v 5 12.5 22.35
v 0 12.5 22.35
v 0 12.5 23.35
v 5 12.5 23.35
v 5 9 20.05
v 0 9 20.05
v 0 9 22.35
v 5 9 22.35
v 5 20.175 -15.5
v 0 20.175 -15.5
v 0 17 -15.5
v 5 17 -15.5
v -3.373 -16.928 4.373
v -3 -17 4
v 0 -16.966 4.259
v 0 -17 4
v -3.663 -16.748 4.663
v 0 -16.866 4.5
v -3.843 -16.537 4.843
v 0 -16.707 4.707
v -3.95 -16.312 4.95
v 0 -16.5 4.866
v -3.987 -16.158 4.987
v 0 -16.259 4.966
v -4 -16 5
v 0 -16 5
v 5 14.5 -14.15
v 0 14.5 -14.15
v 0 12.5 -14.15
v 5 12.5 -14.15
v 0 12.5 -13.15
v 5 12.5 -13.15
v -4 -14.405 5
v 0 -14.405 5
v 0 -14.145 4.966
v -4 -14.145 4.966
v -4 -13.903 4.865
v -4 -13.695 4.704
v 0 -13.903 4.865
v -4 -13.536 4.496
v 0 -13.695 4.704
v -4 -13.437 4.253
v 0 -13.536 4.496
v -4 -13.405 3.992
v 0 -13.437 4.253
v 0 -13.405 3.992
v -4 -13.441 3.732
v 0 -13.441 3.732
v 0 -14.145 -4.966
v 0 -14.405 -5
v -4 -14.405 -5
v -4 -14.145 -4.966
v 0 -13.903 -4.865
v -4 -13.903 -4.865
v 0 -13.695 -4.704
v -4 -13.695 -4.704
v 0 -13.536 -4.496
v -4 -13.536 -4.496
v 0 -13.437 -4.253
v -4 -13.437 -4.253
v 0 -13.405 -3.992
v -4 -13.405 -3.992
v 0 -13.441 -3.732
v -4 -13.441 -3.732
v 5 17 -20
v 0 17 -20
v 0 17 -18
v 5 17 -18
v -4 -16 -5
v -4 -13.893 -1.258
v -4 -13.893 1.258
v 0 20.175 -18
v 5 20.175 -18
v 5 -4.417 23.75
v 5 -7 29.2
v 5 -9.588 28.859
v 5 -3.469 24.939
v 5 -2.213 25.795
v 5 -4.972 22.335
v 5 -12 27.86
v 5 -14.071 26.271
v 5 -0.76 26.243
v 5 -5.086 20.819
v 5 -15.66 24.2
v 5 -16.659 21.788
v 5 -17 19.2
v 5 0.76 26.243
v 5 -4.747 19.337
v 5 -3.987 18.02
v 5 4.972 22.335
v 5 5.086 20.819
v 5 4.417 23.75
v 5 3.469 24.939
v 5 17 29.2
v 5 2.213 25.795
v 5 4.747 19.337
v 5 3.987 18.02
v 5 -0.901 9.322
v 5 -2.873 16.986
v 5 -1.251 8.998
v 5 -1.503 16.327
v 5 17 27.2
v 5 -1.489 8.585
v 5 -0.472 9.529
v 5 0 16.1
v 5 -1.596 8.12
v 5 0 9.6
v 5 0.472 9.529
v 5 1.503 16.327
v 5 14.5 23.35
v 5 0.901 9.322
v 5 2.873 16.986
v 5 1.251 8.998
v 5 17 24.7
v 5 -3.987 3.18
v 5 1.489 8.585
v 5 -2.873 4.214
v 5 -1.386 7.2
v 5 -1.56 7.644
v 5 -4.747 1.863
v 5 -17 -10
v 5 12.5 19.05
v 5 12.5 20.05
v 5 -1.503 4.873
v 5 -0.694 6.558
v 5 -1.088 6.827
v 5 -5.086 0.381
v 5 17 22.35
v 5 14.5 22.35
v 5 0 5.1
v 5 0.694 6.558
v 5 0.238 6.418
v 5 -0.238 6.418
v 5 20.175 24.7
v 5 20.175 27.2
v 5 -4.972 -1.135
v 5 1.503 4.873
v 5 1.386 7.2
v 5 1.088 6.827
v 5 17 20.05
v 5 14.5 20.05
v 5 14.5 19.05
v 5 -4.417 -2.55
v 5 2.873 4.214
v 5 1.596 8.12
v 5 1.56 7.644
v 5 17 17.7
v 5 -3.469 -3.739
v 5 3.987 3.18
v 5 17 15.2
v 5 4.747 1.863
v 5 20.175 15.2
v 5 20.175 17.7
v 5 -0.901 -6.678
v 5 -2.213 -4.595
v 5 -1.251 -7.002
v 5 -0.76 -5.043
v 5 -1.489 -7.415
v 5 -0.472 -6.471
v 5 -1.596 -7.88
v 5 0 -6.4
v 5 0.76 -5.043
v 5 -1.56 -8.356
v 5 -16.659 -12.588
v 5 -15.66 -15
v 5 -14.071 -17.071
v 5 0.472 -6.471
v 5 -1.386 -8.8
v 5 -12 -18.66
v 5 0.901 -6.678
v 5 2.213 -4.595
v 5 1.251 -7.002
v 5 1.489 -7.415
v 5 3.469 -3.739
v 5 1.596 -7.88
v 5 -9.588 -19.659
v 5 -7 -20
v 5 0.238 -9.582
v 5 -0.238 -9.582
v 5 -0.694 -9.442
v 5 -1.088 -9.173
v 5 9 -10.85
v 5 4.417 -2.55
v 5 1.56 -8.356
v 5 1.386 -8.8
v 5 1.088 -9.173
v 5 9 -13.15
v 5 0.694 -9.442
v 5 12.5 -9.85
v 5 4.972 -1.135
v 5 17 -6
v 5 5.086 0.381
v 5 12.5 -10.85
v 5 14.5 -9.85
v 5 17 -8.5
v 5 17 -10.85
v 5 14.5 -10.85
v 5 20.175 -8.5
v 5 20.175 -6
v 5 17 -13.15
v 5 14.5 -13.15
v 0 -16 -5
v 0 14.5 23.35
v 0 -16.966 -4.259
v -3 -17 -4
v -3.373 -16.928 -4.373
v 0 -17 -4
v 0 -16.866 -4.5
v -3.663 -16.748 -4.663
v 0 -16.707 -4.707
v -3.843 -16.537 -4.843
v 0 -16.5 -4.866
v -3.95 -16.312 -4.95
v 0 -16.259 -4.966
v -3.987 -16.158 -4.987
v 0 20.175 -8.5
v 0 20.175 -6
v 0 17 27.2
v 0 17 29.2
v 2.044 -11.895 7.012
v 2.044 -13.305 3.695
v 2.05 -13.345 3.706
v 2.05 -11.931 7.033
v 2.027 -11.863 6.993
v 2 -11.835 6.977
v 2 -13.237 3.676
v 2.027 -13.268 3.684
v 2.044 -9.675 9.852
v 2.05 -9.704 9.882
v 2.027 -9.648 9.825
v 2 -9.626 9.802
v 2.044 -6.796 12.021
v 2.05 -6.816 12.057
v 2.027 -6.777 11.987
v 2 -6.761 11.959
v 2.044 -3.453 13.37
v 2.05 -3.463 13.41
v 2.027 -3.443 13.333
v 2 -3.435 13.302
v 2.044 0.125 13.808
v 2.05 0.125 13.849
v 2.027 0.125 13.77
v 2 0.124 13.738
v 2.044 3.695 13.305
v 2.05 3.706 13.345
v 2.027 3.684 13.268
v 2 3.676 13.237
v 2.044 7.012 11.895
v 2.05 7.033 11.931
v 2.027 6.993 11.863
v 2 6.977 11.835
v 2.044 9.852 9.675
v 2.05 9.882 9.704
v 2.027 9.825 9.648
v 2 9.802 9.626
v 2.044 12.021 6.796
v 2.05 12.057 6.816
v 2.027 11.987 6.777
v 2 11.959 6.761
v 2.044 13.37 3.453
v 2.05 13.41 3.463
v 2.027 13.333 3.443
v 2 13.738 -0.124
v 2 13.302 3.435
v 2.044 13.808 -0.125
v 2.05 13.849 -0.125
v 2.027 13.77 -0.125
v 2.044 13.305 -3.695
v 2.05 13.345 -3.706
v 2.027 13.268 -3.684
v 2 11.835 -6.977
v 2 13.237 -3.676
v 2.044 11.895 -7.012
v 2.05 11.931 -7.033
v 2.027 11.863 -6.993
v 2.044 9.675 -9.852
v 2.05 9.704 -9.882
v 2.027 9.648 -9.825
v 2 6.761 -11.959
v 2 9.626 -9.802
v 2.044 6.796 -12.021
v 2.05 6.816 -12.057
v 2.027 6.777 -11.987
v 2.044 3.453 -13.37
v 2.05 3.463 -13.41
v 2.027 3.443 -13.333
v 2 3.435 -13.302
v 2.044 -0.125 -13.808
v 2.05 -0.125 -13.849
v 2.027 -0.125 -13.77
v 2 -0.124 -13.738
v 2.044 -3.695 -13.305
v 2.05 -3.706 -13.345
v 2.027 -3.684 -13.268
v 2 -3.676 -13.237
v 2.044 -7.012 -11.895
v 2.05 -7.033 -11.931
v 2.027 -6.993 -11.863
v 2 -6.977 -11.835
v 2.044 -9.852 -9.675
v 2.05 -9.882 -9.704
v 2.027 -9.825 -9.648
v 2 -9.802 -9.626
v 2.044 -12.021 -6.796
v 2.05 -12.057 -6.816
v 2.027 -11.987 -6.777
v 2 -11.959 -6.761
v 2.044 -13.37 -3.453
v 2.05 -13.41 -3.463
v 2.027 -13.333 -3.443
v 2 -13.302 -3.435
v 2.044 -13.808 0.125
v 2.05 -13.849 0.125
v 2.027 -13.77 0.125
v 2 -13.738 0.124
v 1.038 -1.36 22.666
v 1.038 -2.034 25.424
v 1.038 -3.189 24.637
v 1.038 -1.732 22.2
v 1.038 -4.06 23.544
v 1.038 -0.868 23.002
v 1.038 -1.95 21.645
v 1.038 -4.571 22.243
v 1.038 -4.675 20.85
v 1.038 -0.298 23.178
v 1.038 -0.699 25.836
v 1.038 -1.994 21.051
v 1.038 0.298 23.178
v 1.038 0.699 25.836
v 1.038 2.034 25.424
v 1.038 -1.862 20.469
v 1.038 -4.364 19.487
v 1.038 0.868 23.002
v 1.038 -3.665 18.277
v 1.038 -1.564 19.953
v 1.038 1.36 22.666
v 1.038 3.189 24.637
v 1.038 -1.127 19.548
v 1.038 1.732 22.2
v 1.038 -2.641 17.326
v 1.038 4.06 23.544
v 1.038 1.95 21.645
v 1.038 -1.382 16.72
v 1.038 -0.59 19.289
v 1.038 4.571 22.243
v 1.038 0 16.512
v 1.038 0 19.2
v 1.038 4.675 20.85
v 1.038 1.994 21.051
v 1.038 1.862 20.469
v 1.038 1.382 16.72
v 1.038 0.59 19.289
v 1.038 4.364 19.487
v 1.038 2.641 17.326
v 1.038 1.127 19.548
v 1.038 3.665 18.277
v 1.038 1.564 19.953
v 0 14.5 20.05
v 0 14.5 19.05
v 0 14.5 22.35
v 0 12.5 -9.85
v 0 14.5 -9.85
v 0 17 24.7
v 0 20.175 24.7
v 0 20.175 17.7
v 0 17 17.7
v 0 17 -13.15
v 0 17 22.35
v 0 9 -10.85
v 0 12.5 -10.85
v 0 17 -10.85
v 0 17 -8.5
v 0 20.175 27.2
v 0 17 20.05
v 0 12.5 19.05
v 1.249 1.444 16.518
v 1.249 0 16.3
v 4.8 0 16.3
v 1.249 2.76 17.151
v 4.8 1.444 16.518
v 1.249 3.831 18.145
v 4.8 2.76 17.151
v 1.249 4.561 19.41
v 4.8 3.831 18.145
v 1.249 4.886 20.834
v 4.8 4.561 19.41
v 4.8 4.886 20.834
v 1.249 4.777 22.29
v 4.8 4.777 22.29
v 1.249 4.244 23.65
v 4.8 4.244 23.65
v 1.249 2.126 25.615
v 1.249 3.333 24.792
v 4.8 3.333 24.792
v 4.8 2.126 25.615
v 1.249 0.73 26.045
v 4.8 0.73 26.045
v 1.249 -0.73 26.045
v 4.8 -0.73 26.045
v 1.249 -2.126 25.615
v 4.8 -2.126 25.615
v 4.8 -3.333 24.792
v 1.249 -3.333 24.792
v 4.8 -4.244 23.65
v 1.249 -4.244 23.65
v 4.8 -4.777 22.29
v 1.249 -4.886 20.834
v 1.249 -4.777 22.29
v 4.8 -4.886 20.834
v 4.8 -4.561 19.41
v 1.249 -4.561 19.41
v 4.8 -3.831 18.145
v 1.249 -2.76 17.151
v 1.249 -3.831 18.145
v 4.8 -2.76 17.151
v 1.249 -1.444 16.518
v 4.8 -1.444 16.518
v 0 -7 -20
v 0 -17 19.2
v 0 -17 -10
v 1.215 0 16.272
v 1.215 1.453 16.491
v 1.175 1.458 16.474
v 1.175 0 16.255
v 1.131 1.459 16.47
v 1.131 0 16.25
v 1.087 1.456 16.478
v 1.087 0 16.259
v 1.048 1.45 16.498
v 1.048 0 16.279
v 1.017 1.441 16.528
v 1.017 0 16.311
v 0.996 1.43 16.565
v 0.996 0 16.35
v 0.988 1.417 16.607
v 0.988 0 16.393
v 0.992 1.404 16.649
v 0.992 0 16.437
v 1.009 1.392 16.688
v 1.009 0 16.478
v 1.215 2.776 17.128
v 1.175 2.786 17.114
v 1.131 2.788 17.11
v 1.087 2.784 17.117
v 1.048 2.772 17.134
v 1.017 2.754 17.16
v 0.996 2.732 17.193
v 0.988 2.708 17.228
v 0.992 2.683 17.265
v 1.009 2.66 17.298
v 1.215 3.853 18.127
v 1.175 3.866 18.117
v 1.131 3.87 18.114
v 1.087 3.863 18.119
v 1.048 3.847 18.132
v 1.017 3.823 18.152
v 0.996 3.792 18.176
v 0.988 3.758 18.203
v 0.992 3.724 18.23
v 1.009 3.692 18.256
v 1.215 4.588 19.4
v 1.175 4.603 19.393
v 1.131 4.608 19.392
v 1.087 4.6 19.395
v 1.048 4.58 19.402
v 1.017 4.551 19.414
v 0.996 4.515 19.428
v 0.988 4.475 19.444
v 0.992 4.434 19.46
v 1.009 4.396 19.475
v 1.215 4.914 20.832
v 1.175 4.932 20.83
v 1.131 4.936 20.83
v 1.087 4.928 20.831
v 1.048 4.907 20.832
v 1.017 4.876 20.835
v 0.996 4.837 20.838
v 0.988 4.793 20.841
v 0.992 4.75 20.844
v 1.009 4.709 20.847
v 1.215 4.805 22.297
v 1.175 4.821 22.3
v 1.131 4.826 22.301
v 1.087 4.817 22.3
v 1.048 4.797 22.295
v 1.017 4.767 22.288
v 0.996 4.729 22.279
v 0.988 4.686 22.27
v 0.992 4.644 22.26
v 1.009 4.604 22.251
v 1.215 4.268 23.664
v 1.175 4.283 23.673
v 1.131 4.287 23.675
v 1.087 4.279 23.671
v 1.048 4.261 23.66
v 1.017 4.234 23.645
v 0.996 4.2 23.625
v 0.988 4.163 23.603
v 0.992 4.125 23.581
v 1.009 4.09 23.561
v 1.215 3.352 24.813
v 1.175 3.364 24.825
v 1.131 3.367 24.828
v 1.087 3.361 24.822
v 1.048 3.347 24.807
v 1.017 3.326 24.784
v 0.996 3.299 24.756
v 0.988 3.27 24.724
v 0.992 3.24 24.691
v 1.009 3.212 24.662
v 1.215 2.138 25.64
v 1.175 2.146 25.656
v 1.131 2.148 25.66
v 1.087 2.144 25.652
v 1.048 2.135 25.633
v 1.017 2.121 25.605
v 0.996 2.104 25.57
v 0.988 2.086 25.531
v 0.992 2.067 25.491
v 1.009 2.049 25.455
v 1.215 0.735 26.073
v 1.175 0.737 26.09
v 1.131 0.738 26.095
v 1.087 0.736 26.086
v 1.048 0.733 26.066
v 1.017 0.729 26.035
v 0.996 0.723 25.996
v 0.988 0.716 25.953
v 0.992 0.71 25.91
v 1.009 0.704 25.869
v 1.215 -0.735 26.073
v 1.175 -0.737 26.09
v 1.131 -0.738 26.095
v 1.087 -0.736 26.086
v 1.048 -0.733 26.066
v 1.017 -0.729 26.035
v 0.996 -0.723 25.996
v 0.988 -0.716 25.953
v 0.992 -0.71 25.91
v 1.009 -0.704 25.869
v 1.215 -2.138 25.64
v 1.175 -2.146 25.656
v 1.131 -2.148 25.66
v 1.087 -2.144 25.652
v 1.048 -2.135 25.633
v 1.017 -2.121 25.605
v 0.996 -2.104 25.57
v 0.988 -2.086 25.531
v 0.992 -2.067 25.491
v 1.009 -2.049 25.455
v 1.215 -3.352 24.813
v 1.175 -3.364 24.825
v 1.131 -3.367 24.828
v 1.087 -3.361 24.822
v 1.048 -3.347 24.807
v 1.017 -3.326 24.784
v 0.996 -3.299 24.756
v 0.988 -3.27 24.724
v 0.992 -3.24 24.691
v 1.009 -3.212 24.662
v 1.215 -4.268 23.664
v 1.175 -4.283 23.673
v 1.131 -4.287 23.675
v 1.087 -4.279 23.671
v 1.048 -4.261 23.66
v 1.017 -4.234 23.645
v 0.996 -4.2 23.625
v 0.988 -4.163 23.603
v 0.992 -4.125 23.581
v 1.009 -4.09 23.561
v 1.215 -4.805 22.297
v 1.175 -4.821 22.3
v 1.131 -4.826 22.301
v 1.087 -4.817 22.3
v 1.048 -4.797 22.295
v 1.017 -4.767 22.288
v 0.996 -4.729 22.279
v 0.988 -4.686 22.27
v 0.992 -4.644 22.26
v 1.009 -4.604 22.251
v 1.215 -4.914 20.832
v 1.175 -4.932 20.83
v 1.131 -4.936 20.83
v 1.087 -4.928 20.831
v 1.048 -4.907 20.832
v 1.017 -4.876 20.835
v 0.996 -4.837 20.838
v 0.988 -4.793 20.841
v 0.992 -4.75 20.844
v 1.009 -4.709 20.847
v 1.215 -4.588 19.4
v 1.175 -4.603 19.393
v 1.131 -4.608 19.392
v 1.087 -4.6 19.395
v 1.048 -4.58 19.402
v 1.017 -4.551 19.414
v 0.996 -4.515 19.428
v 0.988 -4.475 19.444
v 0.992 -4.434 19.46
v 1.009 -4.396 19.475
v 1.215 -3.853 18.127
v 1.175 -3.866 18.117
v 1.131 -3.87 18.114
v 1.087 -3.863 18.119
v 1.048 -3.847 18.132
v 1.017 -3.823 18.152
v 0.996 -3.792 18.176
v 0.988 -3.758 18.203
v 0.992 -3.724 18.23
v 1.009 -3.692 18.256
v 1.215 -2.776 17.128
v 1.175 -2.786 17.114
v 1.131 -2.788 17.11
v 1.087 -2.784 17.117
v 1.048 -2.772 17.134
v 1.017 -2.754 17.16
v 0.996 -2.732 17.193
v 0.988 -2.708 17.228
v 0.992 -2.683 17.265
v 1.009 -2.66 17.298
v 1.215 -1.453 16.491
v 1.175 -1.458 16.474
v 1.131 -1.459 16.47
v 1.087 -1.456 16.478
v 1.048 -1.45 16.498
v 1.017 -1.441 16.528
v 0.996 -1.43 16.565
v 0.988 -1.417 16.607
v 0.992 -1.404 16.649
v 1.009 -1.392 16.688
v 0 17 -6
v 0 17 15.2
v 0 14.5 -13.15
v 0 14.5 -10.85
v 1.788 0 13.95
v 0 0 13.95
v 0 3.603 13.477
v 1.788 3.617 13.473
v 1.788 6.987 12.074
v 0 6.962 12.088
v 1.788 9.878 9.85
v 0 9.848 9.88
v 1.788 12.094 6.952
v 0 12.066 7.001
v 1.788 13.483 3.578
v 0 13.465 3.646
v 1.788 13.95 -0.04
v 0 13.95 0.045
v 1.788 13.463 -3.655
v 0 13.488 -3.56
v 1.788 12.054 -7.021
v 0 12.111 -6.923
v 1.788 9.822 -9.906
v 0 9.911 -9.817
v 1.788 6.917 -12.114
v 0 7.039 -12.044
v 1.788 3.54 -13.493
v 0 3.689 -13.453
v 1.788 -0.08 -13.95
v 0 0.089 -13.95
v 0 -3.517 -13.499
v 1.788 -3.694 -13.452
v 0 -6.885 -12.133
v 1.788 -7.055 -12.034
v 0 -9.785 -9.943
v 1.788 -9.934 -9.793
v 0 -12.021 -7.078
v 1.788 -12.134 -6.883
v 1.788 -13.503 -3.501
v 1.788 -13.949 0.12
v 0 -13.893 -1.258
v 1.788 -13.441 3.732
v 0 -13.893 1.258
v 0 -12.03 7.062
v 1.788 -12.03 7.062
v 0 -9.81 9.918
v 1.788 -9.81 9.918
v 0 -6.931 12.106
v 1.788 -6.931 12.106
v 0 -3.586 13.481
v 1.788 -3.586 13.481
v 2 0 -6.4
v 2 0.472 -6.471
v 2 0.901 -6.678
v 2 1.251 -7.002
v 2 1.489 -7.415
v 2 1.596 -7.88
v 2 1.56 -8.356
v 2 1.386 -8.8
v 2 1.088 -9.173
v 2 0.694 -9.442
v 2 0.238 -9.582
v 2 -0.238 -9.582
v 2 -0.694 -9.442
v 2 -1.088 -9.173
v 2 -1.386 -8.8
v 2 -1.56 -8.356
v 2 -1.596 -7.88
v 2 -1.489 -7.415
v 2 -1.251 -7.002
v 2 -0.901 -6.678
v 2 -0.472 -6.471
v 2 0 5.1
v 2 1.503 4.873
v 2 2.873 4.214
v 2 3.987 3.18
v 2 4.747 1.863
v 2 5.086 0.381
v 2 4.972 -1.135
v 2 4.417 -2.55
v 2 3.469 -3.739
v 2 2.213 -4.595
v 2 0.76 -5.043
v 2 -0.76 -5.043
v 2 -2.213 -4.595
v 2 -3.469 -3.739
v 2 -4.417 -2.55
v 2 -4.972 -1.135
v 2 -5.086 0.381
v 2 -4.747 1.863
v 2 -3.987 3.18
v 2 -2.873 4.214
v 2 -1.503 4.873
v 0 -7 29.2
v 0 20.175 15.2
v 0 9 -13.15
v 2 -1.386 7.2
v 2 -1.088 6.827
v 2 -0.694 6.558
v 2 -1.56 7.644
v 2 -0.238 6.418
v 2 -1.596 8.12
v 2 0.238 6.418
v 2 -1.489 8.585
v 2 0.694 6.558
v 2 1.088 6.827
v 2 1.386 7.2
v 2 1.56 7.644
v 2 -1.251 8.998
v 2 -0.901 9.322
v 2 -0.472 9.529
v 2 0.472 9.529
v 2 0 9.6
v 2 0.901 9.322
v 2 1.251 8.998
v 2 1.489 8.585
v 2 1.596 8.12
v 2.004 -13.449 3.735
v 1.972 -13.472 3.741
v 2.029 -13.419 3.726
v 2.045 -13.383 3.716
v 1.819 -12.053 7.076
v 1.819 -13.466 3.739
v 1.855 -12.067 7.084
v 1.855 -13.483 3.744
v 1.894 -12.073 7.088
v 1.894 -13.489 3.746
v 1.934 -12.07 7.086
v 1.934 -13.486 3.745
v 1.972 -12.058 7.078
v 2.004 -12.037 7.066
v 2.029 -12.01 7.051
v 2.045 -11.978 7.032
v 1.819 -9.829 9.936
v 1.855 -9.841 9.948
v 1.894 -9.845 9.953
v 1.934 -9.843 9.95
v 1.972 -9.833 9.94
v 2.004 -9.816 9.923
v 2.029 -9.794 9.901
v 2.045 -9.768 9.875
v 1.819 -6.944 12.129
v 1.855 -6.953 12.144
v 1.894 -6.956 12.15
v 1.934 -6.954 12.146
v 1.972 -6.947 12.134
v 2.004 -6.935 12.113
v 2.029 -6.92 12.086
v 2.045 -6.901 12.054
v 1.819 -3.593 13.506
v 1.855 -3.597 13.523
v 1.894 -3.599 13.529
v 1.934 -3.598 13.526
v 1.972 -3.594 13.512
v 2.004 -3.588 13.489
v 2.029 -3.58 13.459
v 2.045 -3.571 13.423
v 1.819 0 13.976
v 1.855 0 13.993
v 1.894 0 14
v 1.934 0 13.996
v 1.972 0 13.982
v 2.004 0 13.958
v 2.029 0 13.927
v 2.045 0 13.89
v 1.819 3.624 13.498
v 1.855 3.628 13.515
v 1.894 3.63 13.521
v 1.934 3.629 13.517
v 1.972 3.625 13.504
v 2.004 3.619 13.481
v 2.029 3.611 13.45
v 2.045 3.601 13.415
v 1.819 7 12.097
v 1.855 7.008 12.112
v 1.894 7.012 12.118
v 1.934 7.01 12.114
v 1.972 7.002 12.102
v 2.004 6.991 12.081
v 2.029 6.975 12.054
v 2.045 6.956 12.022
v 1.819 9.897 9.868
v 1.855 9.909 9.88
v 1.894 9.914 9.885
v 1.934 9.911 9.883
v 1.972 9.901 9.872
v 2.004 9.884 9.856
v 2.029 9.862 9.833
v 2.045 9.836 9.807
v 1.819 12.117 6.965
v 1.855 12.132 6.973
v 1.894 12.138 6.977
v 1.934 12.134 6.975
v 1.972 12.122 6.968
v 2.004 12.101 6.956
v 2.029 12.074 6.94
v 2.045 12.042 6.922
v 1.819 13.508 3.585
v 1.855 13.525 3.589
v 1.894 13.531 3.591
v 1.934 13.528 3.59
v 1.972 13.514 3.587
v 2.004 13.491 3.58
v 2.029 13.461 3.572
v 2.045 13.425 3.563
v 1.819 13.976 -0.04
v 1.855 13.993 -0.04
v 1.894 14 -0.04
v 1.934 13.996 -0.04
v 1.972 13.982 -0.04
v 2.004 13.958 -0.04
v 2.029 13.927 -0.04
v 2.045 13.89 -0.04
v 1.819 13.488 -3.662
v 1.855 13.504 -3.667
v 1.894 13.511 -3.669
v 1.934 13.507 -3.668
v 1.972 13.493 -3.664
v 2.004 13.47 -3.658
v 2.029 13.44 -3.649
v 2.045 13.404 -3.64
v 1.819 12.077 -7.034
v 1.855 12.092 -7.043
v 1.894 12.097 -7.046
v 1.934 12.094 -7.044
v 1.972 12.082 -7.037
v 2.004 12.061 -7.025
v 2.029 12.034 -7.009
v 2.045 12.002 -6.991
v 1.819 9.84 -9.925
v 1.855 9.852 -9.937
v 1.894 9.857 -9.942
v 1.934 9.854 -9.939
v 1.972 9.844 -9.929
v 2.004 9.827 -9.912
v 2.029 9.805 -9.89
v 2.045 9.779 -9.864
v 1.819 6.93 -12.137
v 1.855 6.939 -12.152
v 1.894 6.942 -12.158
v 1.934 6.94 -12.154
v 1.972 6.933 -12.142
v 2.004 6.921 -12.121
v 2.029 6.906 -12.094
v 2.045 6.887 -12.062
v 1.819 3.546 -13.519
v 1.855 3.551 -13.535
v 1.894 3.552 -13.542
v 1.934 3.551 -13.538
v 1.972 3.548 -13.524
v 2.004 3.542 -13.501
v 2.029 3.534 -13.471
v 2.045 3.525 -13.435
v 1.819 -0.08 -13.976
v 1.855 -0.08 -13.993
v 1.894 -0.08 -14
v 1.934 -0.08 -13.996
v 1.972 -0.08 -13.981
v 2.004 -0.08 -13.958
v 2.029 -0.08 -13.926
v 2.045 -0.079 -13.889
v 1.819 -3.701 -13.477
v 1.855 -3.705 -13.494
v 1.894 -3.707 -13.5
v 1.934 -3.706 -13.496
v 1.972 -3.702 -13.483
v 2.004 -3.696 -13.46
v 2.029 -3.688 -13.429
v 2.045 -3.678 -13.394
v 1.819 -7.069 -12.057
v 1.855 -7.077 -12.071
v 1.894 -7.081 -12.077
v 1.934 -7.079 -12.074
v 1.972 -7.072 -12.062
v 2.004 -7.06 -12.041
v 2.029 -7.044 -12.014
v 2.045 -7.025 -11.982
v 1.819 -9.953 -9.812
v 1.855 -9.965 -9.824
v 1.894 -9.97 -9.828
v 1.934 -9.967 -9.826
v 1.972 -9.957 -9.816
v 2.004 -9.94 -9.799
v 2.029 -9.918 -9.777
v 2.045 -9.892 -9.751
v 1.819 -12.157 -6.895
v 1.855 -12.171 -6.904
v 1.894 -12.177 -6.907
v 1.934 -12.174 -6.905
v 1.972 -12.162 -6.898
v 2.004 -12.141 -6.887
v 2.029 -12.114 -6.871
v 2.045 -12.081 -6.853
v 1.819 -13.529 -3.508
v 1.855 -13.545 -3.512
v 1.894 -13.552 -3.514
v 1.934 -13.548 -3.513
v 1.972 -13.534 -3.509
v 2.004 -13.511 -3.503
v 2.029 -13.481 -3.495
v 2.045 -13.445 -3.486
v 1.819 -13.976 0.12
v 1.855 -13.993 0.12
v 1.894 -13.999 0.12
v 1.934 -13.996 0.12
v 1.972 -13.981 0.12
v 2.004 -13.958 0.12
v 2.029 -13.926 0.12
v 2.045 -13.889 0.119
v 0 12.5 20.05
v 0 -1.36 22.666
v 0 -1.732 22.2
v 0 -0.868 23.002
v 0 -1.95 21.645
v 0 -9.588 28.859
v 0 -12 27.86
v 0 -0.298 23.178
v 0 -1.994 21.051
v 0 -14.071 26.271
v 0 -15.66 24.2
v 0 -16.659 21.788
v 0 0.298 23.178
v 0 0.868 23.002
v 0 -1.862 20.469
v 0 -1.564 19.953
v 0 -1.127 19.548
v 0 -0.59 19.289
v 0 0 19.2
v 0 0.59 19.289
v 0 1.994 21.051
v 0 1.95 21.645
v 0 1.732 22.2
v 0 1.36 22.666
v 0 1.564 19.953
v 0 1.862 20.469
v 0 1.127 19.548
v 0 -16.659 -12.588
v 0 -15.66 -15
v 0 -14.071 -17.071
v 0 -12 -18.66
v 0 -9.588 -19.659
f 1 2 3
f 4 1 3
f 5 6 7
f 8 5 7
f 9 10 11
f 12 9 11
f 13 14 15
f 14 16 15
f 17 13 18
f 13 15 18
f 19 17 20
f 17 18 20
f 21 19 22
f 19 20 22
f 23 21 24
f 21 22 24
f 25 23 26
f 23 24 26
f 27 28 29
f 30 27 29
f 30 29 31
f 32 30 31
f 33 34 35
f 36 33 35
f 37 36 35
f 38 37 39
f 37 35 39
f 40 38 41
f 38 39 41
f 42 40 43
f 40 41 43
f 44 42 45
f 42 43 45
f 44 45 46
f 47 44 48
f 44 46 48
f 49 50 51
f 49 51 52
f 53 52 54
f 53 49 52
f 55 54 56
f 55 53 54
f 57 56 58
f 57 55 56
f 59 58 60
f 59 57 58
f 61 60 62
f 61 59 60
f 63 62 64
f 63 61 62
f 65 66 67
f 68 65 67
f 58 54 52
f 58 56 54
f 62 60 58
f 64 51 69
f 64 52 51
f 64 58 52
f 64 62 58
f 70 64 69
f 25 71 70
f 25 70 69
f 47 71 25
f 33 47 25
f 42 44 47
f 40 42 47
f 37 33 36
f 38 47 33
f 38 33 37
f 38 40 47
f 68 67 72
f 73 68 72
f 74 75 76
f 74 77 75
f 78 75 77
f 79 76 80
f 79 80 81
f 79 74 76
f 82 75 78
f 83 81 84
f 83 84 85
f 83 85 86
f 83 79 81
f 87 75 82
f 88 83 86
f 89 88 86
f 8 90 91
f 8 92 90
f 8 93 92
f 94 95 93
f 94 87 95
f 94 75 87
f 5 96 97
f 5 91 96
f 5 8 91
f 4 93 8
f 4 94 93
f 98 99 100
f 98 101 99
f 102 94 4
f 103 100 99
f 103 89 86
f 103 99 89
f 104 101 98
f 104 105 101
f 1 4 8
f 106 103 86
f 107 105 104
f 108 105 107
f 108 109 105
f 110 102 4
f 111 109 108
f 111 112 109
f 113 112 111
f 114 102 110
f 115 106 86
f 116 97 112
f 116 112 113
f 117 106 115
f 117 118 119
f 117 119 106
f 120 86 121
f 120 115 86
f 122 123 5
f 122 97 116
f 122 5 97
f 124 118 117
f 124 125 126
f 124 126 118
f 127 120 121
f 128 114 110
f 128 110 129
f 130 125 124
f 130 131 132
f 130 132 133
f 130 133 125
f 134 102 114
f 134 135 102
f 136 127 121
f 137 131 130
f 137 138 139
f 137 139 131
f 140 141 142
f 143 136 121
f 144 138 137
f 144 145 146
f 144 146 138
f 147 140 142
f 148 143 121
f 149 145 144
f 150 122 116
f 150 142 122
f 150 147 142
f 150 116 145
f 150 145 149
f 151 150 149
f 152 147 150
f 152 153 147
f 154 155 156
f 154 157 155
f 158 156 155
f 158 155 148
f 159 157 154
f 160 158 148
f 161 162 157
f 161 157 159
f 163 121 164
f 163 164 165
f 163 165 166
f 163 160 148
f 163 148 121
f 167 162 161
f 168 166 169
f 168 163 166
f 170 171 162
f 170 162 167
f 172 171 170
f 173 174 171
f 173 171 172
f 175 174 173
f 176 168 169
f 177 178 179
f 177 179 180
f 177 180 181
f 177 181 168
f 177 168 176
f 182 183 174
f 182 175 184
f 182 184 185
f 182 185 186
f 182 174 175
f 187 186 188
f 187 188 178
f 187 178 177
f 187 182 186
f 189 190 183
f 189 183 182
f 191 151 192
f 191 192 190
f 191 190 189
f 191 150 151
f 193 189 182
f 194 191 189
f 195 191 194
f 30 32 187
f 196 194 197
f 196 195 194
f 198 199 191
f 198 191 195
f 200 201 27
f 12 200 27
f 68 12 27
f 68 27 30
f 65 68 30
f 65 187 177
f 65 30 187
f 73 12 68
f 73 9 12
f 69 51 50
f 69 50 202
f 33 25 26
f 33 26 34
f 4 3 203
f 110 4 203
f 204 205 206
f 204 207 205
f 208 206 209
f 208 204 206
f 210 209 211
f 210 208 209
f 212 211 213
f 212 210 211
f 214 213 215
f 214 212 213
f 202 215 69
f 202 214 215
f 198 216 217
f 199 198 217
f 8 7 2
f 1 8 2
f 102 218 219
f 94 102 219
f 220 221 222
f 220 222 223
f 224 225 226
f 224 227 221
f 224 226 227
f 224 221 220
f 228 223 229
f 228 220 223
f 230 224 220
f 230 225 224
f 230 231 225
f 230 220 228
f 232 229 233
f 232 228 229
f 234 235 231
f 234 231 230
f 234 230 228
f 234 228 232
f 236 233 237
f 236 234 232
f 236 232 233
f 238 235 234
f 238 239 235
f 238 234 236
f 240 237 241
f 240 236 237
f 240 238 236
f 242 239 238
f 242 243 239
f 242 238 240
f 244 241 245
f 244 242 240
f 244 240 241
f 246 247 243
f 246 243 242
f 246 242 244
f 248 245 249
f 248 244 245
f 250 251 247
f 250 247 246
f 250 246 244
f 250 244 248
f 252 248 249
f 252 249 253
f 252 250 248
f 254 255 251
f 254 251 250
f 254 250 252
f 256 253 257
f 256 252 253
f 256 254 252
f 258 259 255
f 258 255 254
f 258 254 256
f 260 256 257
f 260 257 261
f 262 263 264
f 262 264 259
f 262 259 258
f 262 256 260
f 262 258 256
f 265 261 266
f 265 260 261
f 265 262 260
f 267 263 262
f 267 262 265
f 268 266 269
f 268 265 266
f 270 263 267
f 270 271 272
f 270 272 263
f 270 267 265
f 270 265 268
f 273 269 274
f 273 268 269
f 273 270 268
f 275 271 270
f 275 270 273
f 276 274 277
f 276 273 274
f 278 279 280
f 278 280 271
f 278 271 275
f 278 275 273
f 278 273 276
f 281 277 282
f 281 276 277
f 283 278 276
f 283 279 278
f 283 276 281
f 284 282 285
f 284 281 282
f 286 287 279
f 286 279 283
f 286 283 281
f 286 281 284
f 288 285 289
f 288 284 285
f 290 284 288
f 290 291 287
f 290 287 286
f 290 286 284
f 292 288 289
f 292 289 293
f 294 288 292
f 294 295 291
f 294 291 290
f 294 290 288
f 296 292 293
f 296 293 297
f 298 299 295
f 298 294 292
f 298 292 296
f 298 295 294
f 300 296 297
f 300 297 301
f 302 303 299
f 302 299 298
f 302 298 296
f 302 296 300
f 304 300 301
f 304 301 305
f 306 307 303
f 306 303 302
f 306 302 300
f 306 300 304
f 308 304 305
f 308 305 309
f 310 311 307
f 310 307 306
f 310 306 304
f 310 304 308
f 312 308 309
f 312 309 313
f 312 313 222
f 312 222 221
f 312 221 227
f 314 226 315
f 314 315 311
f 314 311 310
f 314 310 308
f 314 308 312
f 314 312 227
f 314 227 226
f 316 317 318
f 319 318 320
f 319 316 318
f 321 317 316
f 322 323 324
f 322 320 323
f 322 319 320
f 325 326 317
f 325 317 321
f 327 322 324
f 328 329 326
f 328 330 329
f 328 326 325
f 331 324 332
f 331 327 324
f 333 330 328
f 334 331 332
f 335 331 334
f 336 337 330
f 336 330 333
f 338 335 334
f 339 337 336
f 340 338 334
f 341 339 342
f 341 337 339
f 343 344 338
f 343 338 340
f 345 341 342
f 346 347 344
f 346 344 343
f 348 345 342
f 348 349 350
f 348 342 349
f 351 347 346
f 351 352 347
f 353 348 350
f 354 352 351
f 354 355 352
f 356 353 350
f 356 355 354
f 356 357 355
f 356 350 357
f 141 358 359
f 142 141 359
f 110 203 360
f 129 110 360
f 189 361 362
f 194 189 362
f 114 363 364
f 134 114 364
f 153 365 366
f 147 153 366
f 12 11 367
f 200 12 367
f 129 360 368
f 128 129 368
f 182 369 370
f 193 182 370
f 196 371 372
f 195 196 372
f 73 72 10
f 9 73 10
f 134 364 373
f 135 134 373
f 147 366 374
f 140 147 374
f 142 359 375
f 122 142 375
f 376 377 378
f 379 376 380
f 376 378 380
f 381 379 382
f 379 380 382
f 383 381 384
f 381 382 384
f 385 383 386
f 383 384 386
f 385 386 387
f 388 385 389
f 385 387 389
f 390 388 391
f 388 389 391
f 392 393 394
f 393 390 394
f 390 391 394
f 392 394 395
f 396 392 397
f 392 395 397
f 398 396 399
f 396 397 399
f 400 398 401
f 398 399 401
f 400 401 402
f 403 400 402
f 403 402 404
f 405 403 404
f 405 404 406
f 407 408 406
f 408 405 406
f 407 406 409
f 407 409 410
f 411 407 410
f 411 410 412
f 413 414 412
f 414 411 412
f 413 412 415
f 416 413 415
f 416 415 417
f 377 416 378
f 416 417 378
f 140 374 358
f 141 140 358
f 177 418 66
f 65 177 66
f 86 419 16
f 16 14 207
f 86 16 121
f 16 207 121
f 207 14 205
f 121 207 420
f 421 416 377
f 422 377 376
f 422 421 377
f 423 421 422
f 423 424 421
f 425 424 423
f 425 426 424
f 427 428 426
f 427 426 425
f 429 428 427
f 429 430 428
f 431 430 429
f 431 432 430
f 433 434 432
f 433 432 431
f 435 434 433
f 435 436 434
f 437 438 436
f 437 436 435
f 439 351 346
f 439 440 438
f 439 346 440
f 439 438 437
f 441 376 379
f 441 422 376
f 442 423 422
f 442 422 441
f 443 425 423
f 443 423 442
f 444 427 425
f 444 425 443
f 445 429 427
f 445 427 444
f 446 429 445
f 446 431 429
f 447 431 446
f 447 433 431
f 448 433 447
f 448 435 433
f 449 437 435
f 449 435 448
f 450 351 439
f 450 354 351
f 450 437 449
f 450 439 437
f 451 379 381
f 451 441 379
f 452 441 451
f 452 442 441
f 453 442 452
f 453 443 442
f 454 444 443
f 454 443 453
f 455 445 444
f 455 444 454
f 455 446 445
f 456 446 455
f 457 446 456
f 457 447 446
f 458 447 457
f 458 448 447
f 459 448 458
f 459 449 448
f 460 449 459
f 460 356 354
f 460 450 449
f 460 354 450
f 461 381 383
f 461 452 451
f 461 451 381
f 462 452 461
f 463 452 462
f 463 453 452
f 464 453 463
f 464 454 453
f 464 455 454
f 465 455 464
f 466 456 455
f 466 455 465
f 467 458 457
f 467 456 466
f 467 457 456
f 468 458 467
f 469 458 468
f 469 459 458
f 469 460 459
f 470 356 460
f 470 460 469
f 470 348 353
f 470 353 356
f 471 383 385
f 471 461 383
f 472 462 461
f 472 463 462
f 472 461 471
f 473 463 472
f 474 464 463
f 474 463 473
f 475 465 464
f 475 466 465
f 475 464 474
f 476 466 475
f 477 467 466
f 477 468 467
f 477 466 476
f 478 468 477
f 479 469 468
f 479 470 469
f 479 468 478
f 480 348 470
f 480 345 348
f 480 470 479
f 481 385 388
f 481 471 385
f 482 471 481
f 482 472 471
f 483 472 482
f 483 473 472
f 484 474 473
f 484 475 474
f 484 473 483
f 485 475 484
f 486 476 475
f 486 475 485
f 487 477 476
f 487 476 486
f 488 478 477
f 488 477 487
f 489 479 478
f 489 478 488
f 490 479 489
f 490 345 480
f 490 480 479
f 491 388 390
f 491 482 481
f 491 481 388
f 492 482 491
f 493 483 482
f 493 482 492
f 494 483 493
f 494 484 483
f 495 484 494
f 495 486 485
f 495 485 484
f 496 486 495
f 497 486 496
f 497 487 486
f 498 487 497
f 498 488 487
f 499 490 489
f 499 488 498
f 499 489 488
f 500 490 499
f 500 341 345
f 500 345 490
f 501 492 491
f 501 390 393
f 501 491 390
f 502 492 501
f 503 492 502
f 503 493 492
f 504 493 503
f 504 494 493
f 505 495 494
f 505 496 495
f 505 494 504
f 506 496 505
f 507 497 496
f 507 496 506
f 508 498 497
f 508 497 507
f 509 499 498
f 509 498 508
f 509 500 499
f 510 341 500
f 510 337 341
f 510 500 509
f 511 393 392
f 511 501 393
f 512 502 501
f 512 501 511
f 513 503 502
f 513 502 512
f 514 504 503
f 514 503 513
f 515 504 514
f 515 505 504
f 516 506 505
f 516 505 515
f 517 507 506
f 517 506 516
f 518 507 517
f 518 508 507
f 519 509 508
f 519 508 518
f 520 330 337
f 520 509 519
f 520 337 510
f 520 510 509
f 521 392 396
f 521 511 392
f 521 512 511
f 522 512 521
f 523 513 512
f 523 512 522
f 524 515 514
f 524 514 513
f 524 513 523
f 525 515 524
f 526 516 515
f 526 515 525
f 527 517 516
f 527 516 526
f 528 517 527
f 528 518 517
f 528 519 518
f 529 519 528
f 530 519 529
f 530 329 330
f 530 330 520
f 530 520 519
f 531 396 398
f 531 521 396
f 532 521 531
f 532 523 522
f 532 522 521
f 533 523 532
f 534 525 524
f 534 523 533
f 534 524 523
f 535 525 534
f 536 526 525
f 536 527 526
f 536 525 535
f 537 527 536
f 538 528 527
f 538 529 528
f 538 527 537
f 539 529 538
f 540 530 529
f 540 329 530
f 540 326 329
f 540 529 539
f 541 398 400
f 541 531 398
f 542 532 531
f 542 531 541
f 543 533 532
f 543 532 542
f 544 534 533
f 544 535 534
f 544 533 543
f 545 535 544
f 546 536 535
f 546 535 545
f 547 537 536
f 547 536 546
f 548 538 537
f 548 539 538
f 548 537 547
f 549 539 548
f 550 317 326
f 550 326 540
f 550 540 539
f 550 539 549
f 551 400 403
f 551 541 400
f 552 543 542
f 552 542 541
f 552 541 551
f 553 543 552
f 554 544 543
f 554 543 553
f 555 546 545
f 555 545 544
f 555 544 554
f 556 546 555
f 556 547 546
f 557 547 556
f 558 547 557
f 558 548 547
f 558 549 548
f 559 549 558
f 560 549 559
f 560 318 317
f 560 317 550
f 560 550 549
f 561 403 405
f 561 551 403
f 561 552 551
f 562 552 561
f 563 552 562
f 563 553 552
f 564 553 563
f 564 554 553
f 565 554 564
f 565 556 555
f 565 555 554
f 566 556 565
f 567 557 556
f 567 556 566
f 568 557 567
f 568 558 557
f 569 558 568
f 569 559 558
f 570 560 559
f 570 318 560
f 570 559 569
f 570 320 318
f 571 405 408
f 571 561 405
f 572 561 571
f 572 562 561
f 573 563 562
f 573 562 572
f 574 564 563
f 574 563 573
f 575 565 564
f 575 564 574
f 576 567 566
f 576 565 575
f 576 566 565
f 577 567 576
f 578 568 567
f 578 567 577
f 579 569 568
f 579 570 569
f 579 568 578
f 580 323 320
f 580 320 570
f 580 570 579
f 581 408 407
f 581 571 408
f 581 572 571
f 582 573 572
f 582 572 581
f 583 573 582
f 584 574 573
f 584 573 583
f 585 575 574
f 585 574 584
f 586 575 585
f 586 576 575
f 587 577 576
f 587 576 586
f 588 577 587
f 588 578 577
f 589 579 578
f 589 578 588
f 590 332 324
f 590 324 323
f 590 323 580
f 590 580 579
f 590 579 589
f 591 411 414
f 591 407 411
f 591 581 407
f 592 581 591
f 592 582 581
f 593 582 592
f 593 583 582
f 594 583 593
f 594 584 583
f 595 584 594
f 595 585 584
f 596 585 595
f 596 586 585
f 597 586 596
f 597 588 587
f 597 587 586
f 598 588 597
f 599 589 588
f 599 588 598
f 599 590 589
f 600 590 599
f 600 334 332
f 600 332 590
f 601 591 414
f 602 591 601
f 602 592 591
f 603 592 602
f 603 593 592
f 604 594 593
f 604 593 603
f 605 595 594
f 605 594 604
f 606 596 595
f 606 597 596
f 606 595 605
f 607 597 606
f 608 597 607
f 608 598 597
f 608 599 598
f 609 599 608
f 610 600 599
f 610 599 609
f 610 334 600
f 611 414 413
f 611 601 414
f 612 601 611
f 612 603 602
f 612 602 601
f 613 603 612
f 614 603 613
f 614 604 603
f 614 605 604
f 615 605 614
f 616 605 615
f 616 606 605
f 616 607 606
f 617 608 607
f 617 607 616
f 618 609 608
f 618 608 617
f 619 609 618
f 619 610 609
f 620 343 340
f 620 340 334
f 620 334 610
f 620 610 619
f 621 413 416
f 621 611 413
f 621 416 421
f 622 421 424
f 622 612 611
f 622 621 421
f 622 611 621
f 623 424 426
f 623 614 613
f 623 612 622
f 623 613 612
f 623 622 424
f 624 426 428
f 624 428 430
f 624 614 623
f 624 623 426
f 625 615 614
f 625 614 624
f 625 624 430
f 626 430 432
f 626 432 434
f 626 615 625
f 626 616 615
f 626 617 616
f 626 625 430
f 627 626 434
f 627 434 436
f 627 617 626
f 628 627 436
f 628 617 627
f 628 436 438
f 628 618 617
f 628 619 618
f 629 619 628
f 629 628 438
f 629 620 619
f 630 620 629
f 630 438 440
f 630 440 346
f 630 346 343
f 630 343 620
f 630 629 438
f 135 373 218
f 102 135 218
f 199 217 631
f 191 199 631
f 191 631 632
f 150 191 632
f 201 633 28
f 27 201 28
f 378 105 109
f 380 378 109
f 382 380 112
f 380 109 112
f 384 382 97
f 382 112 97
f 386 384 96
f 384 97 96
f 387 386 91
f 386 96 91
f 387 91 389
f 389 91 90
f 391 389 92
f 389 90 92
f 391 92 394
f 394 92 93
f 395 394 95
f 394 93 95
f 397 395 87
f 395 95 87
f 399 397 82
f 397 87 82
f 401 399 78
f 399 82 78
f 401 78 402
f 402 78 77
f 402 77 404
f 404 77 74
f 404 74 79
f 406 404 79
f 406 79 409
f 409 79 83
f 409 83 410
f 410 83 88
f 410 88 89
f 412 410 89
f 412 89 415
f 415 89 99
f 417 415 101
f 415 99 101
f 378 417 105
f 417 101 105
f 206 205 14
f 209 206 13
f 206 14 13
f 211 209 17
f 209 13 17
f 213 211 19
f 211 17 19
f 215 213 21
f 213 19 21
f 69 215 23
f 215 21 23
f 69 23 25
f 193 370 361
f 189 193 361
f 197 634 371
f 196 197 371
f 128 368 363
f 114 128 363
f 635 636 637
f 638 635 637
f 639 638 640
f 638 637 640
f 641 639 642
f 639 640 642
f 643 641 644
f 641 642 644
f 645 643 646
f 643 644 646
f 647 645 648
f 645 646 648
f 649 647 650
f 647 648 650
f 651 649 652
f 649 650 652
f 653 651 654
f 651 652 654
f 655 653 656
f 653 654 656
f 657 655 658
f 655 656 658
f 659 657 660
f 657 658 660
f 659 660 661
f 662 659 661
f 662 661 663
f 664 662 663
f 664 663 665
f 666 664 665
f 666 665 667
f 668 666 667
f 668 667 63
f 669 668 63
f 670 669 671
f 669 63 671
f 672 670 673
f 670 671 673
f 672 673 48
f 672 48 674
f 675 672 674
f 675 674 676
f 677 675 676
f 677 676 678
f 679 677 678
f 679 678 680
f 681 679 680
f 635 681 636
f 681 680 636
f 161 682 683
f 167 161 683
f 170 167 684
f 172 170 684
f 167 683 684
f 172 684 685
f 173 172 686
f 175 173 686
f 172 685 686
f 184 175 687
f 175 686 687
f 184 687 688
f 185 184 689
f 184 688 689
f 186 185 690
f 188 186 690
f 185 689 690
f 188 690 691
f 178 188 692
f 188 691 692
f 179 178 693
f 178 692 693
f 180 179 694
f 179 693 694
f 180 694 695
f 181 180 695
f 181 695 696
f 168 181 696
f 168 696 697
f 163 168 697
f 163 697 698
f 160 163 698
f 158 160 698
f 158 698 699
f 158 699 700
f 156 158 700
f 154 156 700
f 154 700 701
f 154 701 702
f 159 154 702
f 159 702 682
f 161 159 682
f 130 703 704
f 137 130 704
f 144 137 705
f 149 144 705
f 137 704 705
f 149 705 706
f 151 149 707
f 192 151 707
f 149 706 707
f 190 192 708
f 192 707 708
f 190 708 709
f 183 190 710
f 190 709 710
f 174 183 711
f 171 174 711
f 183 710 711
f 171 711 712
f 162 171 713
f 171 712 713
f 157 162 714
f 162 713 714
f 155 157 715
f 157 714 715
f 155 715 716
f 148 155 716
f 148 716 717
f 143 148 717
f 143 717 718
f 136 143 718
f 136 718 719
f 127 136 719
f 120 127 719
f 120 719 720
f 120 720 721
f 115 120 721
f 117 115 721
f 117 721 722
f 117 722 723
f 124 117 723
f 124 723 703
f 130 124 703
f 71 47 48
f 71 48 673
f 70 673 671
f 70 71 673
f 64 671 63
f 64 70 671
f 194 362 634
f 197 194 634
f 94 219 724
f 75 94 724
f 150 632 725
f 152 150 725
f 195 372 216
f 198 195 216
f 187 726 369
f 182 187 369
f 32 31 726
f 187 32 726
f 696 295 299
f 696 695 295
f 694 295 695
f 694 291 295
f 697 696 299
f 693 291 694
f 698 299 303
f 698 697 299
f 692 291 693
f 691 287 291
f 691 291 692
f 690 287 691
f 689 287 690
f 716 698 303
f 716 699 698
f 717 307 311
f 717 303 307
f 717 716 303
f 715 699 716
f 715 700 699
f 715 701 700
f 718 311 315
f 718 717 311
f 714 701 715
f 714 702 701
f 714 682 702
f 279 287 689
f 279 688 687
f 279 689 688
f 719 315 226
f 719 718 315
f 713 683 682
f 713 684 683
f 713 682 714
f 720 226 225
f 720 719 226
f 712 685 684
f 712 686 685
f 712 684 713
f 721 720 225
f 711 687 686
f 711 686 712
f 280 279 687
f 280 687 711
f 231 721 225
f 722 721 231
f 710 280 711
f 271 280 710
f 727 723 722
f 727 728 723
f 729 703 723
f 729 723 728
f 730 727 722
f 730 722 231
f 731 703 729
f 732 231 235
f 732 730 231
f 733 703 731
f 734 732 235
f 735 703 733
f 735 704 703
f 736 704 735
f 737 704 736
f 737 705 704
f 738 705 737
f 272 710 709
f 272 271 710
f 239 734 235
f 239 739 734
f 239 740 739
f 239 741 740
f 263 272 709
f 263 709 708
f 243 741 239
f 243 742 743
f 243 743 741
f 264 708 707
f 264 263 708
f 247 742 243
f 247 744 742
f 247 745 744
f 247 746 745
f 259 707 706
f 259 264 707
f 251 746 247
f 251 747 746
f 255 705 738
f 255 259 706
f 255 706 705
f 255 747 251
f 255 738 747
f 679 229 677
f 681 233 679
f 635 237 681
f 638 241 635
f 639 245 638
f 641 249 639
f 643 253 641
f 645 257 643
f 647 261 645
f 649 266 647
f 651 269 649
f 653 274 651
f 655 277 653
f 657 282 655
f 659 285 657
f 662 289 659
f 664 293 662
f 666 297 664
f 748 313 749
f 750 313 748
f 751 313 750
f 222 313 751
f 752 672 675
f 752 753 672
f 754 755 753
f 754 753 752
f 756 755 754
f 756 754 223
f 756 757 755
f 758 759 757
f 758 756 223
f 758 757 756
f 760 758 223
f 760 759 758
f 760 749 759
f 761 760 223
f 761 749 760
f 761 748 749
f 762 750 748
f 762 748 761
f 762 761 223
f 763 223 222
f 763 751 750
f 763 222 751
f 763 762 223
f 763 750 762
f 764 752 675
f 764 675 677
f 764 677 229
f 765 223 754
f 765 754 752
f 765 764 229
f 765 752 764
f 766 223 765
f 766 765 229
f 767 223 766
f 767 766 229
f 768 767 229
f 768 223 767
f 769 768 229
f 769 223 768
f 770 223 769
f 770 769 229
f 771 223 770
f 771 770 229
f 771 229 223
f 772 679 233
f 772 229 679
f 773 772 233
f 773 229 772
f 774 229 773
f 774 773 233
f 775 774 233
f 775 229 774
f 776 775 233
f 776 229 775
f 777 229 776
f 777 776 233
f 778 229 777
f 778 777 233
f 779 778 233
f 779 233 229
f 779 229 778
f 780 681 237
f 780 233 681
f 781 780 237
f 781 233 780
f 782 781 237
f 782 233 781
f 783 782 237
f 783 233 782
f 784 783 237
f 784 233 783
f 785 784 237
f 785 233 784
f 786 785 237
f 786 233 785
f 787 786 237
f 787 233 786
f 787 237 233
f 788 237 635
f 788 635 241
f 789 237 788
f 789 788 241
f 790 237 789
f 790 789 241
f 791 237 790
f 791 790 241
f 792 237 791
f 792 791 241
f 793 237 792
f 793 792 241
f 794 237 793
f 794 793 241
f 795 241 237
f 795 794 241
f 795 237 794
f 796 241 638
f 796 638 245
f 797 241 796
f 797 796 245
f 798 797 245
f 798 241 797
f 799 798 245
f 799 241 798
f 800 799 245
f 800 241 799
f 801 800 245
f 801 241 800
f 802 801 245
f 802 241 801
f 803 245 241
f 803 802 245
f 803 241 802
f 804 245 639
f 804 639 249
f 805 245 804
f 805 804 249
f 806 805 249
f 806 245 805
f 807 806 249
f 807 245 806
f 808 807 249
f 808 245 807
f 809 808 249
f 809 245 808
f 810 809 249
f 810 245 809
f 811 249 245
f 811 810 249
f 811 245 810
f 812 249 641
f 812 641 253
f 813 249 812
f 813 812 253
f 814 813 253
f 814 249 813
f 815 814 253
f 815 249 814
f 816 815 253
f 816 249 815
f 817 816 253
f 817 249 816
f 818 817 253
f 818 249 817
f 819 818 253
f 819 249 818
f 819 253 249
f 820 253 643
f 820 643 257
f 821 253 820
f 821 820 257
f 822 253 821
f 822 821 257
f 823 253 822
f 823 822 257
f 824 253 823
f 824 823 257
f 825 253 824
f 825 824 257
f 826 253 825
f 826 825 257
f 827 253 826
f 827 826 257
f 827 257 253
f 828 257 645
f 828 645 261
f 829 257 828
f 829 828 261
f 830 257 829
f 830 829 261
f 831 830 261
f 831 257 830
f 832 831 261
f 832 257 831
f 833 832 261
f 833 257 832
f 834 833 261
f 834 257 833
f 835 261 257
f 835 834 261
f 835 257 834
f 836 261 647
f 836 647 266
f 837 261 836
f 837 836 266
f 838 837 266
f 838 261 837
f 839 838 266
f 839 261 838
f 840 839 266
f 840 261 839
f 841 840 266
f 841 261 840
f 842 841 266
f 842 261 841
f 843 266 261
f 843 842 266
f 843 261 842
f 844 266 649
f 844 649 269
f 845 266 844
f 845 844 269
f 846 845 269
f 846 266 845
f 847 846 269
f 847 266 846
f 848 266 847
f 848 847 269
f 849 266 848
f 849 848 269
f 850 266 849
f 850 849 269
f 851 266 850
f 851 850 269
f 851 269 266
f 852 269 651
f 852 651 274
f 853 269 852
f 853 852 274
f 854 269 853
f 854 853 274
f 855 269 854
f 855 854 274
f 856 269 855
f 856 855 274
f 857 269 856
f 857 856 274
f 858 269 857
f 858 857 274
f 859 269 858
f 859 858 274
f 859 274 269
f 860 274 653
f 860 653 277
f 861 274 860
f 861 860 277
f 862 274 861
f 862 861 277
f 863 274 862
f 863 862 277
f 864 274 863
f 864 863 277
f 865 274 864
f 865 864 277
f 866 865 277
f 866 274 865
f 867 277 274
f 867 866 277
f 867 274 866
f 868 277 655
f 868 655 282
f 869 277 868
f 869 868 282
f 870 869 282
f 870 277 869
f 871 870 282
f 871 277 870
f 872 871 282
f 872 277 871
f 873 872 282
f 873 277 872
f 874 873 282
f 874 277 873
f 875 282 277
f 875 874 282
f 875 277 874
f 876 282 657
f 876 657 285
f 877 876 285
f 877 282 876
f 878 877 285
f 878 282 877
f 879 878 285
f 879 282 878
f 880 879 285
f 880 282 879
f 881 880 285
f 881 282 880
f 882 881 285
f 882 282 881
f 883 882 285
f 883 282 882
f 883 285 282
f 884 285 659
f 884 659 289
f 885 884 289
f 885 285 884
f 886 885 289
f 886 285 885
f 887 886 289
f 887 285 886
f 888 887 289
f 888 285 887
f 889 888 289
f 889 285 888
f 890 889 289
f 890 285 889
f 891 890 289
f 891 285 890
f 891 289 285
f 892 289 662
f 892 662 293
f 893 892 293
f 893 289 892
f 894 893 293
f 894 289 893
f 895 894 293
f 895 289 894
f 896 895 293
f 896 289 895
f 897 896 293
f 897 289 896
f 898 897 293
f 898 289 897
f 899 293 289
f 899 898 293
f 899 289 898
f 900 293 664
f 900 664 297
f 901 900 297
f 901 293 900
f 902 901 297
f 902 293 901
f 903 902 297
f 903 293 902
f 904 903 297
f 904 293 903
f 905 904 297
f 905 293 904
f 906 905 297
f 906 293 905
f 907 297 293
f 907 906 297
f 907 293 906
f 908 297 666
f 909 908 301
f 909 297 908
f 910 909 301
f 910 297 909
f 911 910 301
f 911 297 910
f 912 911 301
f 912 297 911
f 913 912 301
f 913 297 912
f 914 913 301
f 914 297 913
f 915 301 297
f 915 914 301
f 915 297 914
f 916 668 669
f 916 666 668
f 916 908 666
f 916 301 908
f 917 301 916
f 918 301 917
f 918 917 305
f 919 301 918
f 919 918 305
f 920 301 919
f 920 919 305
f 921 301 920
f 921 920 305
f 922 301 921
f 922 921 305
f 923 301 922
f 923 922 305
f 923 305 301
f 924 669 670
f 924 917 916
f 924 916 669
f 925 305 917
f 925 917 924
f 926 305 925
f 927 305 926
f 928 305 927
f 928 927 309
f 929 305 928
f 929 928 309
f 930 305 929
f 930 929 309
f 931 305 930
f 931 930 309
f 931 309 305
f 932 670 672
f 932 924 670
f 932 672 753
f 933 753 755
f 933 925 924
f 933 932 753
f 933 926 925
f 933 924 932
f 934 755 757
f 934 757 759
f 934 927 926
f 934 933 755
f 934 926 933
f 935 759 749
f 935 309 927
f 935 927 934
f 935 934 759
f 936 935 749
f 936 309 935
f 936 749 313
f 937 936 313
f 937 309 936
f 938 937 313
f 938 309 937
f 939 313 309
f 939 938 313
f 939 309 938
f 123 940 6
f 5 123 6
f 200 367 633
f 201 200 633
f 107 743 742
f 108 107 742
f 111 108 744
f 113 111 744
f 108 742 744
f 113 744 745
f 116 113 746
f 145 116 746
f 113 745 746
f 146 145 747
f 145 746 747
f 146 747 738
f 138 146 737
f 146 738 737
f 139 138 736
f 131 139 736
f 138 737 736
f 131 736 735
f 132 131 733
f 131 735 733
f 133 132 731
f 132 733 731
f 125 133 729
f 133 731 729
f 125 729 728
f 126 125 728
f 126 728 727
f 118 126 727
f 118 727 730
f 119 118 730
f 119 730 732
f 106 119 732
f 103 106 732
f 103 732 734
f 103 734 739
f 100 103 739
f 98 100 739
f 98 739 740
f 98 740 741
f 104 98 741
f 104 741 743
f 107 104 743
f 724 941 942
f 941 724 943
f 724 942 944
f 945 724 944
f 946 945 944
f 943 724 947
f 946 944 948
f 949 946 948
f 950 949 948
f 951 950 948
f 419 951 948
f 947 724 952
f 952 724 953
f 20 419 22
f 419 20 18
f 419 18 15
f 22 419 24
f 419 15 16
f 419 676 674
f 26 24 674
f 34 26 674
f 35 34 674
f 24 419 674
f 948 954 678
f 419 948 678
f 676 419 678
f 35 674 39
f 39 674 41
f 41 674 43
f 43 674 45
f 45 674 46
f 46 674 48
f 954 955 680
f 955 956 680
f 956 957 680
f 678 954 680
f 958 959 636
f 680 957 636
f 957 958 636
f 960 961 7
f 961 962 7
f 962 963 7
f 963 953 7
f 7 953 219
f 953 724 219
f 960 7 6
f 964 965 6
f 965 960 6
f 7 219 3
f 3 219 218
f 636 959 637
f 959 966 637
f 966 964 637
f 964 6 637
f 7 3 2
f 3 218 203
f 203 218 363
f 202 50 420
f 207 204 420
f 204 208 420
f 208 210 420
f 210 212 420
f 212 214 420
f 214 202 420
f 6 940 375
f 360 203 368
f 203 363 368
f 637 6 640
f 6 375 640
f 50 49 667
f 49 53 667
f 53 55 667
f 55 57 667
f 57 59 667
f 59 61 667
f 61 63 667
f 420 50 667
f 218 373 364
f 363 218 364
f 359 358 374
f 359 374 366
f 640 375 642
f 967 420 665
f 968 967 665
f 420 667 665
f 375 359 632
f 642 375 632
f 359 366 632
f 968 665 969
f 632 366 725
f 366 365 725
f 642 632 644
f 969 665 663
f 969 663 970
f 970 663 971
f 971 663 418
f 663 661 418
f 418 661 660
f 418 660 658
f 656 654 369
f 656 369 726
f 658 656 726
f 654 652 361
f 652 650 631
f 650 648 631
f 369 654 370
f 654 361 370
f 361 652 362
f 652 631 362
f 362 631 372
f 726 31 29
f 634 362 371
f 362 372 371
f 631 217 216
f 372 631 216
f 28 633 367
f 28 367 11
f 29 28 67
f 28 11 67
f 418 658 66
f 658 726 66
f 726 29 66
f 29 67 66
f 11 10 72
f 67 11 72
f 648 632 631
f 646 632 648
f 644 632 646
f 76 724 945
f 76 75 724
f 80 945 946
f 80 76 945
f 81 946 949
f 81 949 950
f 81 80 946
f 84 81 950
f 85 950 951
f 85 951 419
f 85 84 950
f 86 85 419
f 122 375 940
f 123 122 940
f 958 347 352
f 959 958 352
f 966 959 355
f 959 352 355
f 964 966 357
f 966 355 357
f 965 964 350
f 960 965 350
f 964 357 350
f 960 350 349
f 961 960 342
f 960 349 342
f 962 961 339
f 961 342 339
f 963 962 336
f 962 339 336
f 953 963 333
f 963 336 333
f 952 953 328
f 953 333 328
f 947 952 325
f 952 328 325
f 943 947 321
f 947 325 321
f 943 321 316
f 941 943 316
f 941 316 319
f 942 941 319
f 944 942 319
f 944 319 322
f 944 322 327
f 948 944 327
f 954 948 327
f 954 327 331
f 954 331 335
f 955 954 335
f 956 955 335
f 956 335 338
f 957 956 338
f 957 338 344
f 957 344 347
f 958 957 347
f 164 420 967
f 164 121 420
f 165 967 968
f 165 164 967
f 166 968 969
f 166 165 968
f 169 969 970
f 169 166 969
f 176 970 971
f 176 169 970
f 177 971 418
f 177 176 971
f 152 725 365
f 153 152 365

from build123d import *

# Parameters (mm, degrees)
BOSS_EXTRUDE1_DEPTH = 5
SKETCH2_R           = 13.95
CUT_EXTRUDE1_DEPTH  = 2
SKETCH3_R           = 4.9
CUT_EXTRUDE2_DEPTH  = 3.9624
CUT_EXTRUDE3_REACH  = 37.618
SKETCH4_R           = 1.6
SKETCH4_R_2         = 5.1
SKETCH5_R           = 2
CUT_EXTRUDE4_DEPTH  = 36.712340147
FILLET1_R           = 10
BOSS_EXTRUDE2_START = 4
BOSS_EXTRUDE2_DEPTH = 4
FILLET2_R           = 1
CHAMFER1_SIZE       = 0.2
SKETCH7_R           = 0.15
SKETCH10_R          = 0.15


with BuildPart() as part:
    # Sketch1 → Boss-Extrude1 (new body)
    with BuildSketch(Plane(origin=(0, 0, 0), x_dir=(0, 0, -1), z_dir=(1, 0, 0))):
        Polygon((-29.2, 17), (-29.2, -17), (20, -17), (20, 17), (18, 17), (18, 20.175), (15.5, 20.175), (15.5, 17), (13.15, 17), (13.15, 14.5), (14.15, 14.5), (14.15, 12.5), (13.15, 12.5), (13.15, 9), (10.85, 9), (10.85, 12.5), (9.85, 12.5), (9.85, 14.5), (10.85, 14.5), (10.85, 17), (8.5, 17), (8.5, 20.175), (6, 20.175), (6, 17), (-15.2, 17), (-15.2, 20.175), (-17.7, 20.175), (-17.7, 17), (-20.05, 17), (-20.05, 14.5), (-19.05, 14.5), (-19.05, 12.5), (-20.05, 12.5), (-20.05, 9), (-22.35, 9), (-22.35, 12.5), (-23.35, 12.5), (-23.35, 14.5), (-22.35, 14.5), (-22.35, 17), (-24.7, 17), (-24.7, 20.175), (-27.2, 20.175), (-27.2, 17), align=None)
    extrude(amount=BOSS_EXTRUDE1_DEPTH)

    # Sketch2 → Cut-Extrude1 (cut)
    with BuildSketch(Plane.ZY):
        Circle(SKETCH2_R)
    extrude(amount=-CUT_EXTRUDE1_DEPTH, mode=Mode.SUBTRACT)

    # Sketch3 → Cut-Extrude2 (cut)
    with BuildSketch(Plane(origin=(5, 0, 0), x_dir=(0, 0, -1), z_dir=(1, 0, 0))):
        with Locations((-21.2, 0)):
            Circle(SKETCH3_R)
    extrude(amount=-CUT_EXTRUDE2_DEPTH, mode=Mode.SUBTRACT)

    # Sketch4 → Cut-Extrude3 (cut, up to next)
    with BuildSketch(Plane.ZY.offset(-2), mode=Mode.PRIVATE) as cut_extrude3_sk1:
        with Locations((-8, 0)):
            Circle(SKETCH4_R)
    cut_extrude3_tool1 = extrude(cut_extrude3_sk1.sketch, amount=-CUT_EXTRUDE3_REACH, mode=Mode.PRIVATE) & part.part
    # Sketch4 → Cut-Extrude3 (cut, up to next)
    with BuildSketch(Plane.ZY.offset(-2), mode=Mode.PRIVATE) as cut_extrude3_sk2:
        with Locations((8, 0)):
            Circle(SKETCH4_R)
    cut_extrude3_tool2 = extrude(cut_extrude3_sk2.sketch, amount=-CUT_EXTRUDE3_REACH, mode=Mode.PRIVATE) & part.part
    # Sketch4 → Cut-Extrude3 (cut, up to next)
    with BuildSketch(Plane.ZY.offset(-2), mode=Mode.PRIVATE) as cut_extrude3_sk3:
        Circle(SKETCH4_R_2)
    cut_extrude3_tool3 = extrude(cut_extrude3_sk3.sketch, amount=-CUT_EXTRUDE3_REACH, mode=Mode.PRIVATE) & part.part
    add(cut_extrude3_tool1.solids().sort_by_distance((2, 0, -8))[0], mode=Mode.SUBTRACT)
    add(cut_extrude3_tool2.solids().sort_by_distance((2, 0, 8))[0], mode=Mode.SUBTRACT)
    add(cut_extrude3_tool3.solids().sort_by_distance((2, 0, 0))[0], mode=Mode.SUBTRACT)

    # Sketch5 → Cut-Extrude4 (cut, through all)
    with BuildSketch(Plane(origin=(1.0376, 0, 0), x_dir=(0, 0, -1), z_dir=(1, 0, 0))):
        with Locations((-21.2, 0)):
            Circle(SKETCH5_R)
    extrude(amount=-CUT_EXTRUDE4_DEPTH, mode=Mode.SUBTRACT)

    # Fillet1
    fillet1_edges = [part.edges().sort_by_distance(p)[0] for p in [
        (2.5, -17, -20),
        (2.5, -17, 29.2),
    ]]
    fillet(fillet1_edges, radius=FILLET1_R)

    # Sketch6 → Boss-Extrude2 (add)
    with BuildSketch(Plane.ZY.offset(BOSS_EXTRUDE2_START)):
        with BuildLine():
            Line((-5, -13.02315246), (-5, -17))
            Line((-5, -17), (5, -17))
            Line((5, -17), (5, -13.02315246))
            ThreePointArc((5, -13.02315246), (0, -13.95), (-5, -13.02315246))
        make_face()
    extrude(amount=-BOSS_EXTRUDE2_DEPTH)

    # Fillet2
    fillet2_edges = [part.edges().sort_by_distance(p)[0] for p in [
        (-2, -13.02315246, 5),
        (-2, -13.02315246, -5),
        (-4, -17, 0),
        (-2, -17, 5),
        (-2, -17, -5),
    ]]
    fillet(fillet2_edges, radius=FILLET2_R)

    # Chamfer1
    chamfer1_edges = [part.edges().sort_by_distance(p)[0] for p in [
        (5, 0, 26.1),
    ]]
    chamfer(chamfer1_edges, length=CHAMFER1_SIZE)

    # Sketch7 → Cut-Revolve1 (revolve, cut)
    with BuildSketch(Plane(origin=(0, 0, 0), x_dir=(1, 0, 0), z_dir=(0, 1, 0))):
        with Locations((1.9, -13.85)):
            Circle(SKETCH7_R)
    revolve(axis=Axis((5, 0, 0), (-1, 0, 0)), mode=Mode.SUBTRACT)

    # Sketch10 → Cut-Revolve2 (revolve, cut)
    with BuildSketch(Plane(origin=(0, 0, 0), x_dir=(1, 0, 0), z_dir=(0, 1, 0))):
        with Locations((1.1376, -16.4)):
            Circle(SKETCH10_R)
    revolve(axis=Axis((0, 0, 21.2), (1, 0, 0)), mode=Mode.SUBTRACT)


solid = part.part
